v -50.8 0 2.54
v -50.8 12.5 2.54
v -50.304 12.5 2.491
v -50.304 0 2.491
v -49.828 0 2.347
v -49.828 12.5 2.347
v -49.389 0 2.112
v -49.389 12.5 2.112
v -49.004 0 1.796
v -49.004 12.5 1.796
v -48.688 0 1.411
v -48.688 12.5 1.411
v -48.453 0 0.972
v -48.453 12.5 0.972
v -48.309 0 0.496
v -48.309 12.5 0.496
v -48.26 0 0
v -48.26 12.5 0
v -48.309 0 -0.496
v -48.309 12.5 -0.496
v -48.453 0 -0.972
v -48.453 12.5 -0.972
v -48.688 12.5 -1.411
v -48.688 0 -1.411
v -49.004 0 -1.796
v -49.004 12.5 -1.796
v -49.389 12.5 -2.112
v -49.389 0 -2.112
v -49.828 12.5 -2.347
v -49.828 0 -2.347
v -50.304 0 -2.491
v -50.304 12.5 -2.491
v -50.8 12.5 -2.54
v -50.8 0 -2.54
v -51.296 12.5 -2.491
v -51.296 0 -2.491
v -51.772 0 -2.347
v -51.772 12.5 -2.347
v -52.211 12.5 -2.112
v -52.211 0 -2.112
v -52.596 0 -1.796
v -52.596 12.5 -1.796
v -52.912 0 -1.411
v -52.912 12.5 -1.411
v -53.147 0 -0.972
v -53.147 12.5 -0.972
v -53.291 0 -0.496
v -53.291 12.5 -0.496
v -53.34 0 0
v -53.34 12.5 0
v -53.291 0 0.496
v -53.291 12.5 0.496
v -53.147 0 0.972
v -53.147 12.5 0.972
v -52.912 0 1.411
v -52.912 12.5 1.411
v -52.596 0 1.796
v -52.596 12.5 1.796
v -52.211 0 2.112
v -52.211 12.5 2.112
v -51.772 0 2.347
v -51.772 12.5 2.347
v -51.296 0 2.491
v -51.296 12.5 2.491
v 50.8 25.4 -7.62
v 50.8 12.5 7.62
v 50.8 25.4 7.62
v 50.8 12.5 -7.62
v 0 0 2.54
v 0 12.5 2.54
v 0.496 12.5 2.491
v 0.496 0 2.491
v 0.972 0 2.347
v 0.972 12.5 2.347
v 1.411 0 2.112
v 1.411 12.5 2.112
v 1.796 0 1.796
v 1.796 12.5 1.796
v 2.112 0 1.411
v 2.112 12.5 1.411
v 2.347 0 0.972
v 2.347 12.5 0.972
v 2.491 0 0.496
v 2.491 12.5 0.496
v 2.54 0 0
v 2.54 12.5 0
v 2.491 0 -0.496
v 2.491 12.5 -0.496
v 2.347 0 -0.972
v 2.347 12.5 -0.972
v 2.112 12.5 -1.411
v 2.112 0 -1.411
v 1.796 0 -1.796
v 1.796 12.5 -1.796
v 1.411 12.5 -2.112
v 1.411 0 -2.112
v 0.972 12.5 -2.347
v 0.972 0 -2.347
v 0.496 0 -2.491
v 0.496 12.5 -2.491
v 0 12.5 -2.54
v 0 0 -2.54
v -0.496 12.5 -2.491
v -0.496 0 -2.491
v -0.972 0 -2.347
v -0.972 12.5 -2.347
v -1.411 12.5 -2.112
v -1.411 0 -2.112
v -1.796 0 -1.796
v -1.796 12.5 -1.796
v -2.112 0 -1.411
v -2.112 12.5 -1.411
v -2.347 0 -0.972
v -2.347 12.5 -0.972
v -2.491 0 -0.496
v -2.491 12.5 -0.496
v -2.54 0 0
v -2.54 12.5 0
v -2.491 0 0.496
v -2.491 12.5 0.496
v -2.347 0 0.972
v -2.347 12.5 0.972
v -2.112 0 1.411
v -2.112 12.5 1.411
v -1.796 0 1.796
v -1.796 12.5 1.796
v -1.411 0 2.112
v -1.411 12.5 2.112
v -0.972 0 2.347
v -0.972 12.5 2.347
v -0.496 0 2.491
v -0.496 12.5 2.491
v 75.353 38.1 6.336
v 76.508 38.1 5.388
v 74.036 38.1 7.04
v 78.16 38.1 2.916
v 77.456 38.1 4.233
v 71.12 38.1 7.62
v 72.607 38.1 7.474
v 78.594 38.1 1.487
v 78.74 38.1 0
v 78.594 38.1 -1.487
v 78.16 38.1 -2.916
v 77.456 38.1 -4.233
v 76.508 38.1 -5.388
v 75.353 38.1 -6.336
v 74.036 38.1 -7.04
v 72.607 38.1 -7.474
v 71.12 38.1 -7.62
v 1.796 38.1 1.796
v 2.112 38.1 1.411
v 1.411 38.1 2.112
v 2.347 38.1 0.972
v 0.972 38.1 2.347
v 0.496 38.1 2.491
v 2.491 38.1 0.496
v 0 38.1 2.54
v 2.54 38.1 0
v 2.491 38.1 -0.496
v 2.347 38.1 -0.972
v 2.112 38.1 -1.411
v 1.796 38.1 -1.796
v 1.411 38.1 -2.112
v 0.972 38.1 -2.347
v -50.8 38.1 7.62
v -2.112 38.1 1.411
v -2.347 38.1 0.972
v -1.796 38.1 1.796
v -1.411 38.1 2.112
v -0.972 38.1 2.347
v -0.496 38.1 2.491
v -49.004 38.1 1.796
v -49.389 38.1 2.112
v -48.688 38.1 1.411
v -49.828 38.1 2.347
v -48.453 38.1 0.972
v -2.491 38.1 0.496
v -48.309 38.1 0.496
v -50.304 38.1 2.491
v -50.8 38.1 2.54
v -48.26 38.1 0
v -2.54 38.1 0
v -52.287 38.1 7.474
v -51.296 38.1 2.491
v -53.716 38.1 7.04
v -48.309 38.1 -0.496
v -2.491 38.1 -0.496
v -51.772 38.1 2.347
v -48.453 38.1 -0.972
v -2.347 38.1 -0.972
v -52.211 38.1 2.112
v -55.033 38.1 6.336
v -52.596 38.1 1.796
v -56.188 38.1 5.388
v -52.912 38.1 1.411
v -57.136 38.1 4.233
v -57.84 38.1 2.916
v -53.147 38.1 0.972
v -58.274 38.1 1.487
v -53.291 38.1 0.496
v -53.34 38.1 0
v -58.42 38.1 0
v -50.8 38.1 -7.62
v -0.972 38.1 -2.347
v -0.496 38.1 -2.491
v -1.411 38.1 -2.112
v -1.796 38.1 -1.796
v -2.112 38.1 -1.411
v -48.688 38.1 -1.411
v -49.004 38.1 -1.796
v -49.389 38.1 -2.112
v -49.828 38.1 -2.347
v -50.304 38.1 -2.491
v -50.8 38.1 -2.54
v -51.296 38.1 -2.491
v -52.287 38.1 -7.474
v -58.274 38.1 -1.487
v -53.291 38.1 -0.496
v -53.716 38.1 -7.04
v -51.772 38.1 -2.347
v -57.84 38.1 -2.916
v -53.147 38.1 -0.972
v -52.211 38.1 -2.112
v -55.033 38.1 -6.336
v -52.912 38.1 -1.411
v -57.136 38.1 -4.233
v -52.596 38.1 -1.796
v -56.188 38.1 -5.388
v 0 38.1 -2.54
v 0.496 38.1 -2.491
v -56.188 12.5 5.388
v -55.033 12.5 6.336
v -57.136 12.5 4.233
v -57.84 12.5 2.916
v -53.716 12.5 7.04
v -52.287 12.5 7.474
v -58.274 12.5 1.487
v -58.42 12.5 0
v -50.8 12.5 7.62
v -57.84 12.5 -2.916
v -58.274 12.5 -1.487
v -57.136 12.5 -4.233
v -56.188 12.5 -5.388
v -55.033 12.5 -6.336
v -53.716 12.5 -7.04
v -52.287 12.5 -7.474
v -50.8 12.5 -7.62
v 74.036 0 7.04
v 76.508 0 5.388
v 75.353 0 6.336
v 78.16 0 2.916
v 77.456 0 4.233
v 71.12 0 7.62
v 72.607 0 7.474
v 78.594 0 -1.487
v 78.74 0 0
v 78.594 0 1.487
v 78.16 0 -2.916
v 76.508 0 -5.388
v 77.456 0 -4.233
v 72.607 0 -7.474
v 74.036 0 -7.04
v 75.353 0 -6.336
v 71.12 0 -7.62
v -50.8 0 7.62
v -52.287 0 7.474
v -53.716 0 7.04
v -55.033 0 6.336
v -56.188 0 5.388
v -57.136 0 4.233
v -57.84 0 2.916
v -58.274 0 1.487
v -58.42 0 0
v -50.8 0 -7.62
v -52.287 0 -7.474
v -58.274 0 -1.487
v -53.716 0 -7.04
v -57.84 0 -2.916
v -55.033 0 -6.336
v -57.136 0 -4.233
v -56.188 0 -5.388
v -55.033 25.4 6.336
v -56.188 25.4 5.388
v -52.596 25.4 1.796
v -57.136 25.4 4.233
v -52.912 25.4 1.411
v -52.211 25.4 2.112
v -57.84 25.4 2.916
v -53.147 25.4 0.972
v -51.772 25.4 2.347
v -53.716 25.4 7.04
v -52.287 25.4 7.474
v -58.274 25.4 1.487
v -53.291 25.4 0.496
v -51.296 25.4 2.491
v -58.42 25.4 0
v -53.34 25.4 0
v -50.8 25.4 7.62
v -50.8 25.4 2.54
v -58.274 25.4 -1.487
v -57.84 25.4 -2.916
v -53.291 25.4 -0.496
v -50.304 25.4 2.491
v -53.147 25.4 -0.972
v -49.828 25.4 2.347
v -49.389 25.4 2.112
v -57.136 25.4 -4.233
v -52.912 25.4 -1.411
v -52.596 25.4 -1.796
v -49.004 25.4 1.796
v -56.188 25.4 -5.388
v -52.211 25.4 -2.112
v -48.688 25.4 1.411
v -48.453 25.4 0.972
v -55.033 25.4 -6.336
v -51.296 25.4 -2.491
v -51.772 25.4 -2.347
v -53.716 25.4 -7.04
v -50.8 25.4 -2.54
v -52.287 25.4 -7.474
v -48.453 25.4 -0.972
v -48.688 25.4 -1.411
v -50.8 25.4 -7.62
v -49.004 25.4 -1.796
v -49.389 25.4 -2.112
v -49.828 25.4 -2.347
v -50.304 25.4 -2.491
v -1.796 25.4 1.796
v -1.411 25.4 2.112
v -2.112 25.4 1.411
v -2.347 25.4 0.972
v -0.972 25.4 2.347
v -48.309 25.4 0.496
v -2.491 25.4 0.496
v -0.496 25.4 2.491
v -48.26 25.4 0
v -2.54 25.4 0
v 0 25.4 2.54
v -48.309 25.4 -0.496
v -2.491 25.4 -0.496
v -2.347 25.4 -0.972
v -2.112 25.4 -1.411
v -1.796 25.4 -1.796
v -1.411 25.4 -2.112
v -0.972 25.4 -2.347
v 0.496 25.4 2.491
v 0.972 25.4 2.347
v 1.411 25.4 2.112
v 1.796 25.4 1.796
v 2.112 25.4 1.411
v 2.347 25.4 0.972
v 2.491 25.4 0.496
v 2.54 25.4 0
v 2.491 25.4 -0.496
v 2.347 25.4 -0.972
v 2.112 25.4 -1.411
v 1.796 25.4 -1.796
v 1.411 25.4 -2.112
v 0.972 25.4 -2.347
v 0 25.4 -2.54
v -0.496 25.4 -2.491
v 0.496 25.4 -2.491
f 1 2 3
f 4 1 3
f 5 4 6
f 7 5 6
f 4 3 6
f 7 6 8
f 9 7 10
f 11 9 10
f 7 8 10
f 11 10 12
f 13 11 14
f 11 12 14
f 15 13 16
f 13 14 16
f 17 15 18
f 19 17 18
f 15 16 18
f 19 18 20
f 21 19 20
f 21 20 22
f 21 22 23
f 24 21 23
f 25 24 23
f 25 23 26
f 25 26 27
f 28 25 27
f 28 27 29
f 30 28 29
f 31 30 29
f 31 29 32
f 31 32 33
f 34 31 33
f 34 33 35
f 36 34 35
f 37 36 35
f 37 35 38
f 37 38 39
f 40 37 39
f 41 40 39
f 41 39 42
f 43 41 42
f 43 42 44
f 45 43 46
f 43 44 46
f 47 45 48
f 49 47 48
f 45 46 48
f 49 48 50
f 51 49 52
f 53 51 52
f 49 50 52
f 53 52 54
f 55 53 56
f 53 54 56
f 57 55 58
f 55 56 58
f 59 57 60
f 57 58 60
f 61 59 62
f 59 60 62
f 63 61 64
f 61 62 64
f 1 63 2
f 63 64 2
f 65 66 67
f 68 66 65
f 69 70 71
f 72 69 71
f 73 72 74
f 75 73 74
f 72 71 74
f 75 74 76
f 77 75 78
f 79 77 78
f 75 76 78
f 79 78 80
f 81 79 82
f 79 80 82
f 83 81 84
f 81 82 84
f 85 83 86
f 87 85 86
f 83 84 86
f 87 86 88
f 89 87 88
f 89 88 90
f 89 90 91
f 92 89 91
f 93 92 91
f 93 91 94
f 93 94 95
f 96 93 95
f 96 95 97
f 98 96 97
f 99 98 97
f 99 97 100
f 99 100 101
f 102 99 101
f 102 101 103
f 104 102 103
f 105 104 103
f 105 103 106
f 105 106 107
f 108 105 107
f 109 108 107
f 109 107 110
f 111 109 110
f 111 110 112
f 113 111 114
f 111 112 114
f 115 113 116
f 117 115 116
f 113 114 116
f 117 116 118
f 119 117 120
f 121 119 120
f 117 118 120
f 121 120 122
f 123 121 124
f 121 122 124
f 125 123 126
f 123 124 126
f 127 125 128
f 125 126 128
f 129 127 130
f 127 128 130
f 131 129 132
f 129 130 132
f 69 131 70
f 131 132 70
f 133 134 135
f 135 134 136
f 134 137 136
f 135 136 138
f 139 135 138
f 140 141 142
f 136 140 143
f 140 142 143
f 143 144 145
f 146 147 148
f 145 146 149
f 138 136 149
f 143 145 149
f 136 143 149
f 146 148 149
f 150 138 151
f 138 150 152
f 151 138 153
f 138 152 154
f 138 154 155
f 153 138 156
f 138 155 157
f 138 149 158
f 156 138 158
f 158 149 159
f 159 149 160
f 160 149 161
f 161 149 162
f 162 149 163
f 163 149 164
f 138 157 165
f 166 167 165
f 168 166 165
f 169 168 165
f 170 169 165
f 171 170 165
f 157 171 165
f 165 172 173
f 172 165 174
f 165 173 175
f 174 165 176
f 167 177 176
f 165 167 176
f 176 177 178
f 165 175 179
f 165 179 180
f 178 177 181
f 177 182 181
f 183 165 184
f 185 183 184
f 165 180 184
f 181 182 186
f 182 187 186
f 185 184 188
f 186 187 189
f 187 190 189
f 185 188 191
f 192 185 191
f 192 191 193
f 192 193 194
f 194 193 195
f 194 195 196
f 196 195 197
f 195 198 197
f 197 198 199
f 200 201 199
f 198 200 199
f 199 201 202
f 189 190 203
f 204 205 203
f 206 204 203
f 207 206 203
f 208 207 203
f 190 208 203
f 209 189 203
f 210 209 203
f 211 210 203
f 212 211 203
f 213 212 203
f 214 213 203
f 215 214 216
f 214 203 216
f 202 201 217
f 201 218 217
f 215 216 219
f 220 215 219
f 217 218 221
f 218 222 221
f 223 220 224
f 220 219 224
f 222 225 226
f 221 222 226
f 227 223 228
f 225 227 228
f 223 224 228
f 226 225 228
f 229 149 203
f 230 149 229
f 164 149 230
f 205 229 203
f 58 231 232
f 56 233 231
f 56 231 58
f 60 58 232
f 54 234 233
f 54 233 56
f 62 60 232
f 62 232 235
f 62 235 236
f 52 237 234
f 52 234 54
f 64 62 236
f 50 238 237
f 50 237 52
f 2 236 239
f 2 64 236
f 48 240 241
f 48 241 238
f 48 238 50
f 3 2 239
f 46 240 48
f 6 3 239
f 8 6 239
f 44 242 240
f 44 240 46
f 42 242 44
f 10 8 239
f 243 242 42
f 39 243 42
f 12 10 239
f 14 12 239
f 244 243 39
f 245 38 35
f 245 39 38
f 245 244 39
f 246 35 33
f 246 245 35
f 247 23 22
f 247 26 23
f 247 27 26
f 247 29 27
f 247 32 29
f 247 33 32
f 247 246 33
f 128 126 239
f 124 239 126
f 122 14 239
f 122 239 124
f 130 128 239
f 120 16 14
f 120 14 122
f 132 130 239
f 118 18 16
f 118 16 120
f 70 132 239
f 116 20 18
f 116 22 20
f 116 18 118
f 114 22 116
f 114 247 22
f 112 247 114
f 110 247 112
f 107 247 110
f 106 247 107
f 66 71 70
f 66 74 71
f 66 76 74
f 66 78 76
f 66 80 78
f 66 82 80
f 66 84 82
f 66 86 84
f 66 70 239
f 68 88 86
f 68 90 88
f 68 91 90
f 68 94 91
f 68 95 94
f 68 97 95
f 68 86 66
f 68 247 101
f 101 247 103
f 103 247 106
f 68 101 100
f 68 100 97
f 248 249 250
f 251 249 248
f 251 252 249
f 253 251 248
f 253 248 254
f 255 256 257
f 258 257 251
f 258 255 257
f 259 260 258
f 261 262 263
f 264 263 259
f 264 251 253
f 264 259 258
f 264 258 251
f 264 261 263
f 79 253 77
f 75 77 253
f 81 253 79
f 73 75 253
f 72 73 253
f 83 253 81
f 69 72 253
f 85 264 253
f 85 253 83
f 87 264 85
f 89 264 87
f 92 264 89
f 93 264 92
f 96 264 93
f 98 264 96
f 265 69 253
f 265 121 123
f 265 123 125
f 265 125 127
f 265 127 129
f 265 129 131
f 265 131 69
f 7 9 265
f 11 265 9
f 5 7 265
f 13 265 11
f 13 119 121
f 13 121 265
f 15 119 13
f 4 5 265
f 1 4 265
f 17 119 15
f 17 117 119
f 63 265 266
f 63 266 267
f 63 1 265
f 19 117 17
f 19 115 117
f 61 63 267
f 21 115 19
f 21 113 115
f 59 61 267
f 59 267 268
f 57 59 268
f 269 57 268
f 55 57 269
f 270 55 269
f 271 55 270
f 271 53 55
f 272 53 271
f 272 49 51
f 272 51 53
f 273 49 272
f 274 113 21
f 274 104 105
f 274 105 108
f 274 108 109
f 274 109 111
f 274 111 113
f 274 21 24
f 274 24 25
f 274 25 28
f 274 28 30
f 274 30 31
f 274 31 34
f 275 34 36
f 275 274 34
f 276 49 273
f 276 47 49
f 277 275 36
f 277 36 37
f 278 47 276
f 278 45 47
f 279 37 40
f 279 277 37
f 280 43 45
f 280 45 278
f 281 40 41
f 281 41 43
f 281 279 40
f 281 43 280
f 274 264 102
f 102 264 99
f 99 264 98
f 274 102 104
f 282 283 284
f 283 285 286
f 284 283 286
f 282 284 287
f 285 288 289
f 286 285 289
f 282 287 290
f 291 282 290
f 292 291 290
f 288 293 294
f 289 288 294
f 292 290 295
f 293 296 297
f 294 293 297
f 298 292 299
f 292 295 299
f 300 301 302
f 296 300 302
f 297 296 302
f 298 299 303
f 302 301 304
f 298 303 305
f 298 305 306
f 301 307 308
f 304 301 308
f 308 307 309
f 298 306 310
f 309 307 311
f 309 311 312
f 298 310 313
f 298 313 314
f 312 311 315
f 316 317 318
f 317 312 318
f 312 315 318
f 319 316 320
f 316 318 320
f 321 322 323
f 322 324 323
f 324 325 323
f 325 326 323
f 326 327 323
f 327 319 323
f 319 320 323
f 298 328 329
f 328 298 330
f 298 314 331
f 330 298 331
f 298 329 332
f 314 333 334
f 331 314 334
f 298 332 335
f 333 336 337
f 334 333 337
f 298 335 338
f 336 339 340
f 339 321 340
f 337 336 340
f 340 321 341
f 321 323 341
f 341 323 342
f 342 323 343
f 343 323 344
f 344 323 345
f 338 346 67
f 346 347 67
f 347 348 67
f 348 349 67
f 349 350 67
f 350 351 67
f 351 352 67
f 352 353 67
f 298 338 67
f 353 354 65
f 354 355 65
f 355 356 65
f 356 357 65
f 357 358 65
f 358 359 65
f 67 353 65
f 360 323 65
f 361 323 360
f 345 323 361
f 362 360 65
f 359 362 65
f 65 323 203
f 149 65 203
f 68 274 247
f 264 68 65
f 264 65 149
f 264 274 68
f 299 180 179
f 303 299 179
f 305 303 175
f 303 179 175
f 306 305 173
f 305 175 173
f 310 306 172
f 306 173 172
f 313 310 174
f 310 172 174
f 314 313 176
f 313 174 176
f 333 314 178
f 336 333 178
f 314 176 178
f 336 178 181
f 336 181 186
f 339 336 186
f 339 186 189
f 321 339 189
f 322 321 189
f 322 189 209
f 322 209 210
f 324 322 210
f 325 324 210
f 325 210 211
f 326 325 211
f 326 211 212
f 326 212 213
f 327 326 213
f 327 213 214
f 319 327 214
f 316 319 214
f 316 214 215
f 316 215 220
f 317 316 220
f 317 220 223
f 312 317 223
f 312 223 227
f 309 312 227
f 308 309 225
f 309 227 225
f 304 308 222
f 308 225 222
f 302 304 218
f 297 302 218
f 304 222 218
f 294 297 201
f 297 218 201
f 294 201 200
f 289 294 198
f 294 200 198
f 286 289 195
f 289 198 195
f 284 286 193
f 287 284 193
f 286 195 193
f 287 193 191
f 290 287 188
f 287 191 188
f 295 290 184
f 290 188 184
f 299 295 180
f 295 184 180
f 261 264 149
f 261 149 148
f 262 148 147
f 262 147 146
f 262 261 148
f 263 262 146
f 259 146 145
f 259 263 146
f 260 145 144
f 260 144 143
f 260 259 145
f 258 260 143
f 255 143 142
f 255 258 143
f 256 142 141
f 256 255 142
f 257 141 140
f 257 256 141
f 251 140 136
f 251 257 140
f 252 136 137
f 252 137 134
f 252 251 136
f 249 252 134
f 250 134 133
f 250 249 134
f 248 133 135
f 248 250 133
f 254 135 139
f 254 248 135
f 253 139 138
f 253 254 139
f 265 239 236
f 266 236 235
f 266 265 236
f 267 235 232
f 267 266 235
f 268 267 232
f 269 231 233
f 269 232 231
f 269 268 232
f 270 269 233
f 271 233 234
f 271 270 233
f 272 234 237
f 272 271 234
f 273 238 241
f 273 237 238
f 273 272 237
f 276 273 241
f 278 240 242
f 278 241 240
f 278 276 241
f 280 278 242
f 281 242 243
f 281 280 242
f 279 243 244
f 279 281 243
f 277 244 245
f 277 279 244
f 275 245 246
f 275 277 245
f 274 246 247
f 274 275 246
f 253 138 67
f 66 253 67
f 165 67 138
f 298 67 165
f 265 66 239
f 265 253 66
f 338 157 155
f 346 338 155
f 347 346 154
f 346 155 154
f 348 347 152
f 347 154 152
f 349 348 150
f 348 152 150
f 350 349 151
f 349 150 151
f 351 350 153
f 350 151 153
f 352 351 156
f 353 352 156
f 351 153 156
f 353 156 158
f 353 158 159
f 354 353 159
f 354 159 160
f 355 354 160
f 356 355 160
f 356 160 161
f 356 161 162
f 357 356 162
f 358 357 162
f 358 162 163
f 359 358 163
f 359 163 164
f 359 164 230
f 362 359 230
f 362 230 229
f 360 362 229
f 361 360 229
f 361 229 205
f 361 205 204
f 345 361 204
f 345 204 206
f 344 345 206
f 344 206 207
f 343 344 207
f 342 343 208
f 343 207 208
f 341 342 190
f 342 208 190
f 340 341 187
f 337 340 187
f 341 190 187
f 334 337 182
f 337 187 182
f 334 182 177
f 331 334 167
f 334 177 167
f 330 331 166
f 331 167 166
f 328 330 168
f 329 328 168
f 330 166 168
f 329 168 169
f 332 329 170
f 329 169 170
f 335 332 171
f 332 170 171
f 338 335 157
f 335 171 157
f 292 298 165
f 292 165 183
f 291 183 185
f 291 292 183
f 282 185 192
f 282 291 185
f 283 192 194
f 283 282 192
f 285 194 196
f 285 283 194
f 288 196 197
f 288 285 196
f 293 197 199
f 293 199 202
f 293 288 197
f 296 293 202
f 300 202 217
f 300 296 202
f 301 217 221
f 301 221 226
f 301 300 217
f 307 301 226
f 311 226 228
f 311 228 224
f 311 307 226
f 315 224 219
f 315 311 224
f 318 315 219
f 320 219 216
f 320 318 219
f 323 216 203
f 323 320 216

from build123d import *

# Parameters (mm, degrees)
BOSS_EXTRUDE1_DEPTH     = 38.1
SKETCH4_R               = 2.54
CUT_EXTRUDE3_DEPTH      = 88.804680969
CUT_EXTRUDE4_DEPTH      = 6.35
CUT_EXTRUDE4_DEPTH_BACK = 6.550000108


with BuildPart() as part:
    # Sketch3 → Boss-Extrude1 (new body)
    with BuildSketch(Plane(origin=(0, 0, 0), x_dir=(1, 0, 0), z_dir=(0, 1, 0))):
        with BuildLine():
            Line((-50.8, 7.62), (71.12, 7.62))
            ThreePointArc((71.12, 7.62), (78.74, 0), (71.12, -7.62))
            Line((71.12, -7.62), (-50.8, -7.62))
            ThreePointArc((-50.8, -7.62), (-58.42, 0), (-50.8, 7.62))
        make_face()
    extrude(amount=BOSS_EXTRUDE1_DEPTH)

    # Sketch4 → Cut-Extrude3 (cut, through all)
    with BuildSketch(Plane(origin=(0, 38.1, 0), x_dir=(1, 0, 0), z_dir=(0, 1, 0))):
        with Locations(Location((-50.8, 0, 0), (0, 0, 270))):
            Circle(SKETCH4_R)
        with Locations(Location((0, 0, 0), (0, 0, 270))):
            Circle(SKETCH4_R)
    extrude(amount=-CUT_EXTRUDE3_DEPTH, mode=Mode.SUBTRACT)

    # Sketch5 → Cut-Extrude4 (cut, two sides: drawn at the far end of the back side and taken through both)
    with BuildSketch(Plane(origin=(0, 19.05, 0), x_dir=(1, 0, 0), z_dir=(0, 1, 0)).offset(-CUT_EXTRUDE4_DEPTH_BACK)):
        with BuildLine():
            Line((25.4, 7.62), (-50.8, 7.62))
            ThreePointArc((-50.8, 7.62), (-58.42, 0), (-50.8, -7.62))
            Line((-50.8, -7.62), (0, -7.62))
            Line((0, -7.62), (50.8, -7.62))
            Line((50.8, -7.62), (50.8, 7.62))
            Line((50.8, 7.62), (25.4, 7.62))
        make_face()
    extrude(amount=CUT_EXTRUDE4_DEPTH + CUT_EXTRUDE4_DEPTH_BACK, mode=Mode.SUBTRACT)


solid = part.part
